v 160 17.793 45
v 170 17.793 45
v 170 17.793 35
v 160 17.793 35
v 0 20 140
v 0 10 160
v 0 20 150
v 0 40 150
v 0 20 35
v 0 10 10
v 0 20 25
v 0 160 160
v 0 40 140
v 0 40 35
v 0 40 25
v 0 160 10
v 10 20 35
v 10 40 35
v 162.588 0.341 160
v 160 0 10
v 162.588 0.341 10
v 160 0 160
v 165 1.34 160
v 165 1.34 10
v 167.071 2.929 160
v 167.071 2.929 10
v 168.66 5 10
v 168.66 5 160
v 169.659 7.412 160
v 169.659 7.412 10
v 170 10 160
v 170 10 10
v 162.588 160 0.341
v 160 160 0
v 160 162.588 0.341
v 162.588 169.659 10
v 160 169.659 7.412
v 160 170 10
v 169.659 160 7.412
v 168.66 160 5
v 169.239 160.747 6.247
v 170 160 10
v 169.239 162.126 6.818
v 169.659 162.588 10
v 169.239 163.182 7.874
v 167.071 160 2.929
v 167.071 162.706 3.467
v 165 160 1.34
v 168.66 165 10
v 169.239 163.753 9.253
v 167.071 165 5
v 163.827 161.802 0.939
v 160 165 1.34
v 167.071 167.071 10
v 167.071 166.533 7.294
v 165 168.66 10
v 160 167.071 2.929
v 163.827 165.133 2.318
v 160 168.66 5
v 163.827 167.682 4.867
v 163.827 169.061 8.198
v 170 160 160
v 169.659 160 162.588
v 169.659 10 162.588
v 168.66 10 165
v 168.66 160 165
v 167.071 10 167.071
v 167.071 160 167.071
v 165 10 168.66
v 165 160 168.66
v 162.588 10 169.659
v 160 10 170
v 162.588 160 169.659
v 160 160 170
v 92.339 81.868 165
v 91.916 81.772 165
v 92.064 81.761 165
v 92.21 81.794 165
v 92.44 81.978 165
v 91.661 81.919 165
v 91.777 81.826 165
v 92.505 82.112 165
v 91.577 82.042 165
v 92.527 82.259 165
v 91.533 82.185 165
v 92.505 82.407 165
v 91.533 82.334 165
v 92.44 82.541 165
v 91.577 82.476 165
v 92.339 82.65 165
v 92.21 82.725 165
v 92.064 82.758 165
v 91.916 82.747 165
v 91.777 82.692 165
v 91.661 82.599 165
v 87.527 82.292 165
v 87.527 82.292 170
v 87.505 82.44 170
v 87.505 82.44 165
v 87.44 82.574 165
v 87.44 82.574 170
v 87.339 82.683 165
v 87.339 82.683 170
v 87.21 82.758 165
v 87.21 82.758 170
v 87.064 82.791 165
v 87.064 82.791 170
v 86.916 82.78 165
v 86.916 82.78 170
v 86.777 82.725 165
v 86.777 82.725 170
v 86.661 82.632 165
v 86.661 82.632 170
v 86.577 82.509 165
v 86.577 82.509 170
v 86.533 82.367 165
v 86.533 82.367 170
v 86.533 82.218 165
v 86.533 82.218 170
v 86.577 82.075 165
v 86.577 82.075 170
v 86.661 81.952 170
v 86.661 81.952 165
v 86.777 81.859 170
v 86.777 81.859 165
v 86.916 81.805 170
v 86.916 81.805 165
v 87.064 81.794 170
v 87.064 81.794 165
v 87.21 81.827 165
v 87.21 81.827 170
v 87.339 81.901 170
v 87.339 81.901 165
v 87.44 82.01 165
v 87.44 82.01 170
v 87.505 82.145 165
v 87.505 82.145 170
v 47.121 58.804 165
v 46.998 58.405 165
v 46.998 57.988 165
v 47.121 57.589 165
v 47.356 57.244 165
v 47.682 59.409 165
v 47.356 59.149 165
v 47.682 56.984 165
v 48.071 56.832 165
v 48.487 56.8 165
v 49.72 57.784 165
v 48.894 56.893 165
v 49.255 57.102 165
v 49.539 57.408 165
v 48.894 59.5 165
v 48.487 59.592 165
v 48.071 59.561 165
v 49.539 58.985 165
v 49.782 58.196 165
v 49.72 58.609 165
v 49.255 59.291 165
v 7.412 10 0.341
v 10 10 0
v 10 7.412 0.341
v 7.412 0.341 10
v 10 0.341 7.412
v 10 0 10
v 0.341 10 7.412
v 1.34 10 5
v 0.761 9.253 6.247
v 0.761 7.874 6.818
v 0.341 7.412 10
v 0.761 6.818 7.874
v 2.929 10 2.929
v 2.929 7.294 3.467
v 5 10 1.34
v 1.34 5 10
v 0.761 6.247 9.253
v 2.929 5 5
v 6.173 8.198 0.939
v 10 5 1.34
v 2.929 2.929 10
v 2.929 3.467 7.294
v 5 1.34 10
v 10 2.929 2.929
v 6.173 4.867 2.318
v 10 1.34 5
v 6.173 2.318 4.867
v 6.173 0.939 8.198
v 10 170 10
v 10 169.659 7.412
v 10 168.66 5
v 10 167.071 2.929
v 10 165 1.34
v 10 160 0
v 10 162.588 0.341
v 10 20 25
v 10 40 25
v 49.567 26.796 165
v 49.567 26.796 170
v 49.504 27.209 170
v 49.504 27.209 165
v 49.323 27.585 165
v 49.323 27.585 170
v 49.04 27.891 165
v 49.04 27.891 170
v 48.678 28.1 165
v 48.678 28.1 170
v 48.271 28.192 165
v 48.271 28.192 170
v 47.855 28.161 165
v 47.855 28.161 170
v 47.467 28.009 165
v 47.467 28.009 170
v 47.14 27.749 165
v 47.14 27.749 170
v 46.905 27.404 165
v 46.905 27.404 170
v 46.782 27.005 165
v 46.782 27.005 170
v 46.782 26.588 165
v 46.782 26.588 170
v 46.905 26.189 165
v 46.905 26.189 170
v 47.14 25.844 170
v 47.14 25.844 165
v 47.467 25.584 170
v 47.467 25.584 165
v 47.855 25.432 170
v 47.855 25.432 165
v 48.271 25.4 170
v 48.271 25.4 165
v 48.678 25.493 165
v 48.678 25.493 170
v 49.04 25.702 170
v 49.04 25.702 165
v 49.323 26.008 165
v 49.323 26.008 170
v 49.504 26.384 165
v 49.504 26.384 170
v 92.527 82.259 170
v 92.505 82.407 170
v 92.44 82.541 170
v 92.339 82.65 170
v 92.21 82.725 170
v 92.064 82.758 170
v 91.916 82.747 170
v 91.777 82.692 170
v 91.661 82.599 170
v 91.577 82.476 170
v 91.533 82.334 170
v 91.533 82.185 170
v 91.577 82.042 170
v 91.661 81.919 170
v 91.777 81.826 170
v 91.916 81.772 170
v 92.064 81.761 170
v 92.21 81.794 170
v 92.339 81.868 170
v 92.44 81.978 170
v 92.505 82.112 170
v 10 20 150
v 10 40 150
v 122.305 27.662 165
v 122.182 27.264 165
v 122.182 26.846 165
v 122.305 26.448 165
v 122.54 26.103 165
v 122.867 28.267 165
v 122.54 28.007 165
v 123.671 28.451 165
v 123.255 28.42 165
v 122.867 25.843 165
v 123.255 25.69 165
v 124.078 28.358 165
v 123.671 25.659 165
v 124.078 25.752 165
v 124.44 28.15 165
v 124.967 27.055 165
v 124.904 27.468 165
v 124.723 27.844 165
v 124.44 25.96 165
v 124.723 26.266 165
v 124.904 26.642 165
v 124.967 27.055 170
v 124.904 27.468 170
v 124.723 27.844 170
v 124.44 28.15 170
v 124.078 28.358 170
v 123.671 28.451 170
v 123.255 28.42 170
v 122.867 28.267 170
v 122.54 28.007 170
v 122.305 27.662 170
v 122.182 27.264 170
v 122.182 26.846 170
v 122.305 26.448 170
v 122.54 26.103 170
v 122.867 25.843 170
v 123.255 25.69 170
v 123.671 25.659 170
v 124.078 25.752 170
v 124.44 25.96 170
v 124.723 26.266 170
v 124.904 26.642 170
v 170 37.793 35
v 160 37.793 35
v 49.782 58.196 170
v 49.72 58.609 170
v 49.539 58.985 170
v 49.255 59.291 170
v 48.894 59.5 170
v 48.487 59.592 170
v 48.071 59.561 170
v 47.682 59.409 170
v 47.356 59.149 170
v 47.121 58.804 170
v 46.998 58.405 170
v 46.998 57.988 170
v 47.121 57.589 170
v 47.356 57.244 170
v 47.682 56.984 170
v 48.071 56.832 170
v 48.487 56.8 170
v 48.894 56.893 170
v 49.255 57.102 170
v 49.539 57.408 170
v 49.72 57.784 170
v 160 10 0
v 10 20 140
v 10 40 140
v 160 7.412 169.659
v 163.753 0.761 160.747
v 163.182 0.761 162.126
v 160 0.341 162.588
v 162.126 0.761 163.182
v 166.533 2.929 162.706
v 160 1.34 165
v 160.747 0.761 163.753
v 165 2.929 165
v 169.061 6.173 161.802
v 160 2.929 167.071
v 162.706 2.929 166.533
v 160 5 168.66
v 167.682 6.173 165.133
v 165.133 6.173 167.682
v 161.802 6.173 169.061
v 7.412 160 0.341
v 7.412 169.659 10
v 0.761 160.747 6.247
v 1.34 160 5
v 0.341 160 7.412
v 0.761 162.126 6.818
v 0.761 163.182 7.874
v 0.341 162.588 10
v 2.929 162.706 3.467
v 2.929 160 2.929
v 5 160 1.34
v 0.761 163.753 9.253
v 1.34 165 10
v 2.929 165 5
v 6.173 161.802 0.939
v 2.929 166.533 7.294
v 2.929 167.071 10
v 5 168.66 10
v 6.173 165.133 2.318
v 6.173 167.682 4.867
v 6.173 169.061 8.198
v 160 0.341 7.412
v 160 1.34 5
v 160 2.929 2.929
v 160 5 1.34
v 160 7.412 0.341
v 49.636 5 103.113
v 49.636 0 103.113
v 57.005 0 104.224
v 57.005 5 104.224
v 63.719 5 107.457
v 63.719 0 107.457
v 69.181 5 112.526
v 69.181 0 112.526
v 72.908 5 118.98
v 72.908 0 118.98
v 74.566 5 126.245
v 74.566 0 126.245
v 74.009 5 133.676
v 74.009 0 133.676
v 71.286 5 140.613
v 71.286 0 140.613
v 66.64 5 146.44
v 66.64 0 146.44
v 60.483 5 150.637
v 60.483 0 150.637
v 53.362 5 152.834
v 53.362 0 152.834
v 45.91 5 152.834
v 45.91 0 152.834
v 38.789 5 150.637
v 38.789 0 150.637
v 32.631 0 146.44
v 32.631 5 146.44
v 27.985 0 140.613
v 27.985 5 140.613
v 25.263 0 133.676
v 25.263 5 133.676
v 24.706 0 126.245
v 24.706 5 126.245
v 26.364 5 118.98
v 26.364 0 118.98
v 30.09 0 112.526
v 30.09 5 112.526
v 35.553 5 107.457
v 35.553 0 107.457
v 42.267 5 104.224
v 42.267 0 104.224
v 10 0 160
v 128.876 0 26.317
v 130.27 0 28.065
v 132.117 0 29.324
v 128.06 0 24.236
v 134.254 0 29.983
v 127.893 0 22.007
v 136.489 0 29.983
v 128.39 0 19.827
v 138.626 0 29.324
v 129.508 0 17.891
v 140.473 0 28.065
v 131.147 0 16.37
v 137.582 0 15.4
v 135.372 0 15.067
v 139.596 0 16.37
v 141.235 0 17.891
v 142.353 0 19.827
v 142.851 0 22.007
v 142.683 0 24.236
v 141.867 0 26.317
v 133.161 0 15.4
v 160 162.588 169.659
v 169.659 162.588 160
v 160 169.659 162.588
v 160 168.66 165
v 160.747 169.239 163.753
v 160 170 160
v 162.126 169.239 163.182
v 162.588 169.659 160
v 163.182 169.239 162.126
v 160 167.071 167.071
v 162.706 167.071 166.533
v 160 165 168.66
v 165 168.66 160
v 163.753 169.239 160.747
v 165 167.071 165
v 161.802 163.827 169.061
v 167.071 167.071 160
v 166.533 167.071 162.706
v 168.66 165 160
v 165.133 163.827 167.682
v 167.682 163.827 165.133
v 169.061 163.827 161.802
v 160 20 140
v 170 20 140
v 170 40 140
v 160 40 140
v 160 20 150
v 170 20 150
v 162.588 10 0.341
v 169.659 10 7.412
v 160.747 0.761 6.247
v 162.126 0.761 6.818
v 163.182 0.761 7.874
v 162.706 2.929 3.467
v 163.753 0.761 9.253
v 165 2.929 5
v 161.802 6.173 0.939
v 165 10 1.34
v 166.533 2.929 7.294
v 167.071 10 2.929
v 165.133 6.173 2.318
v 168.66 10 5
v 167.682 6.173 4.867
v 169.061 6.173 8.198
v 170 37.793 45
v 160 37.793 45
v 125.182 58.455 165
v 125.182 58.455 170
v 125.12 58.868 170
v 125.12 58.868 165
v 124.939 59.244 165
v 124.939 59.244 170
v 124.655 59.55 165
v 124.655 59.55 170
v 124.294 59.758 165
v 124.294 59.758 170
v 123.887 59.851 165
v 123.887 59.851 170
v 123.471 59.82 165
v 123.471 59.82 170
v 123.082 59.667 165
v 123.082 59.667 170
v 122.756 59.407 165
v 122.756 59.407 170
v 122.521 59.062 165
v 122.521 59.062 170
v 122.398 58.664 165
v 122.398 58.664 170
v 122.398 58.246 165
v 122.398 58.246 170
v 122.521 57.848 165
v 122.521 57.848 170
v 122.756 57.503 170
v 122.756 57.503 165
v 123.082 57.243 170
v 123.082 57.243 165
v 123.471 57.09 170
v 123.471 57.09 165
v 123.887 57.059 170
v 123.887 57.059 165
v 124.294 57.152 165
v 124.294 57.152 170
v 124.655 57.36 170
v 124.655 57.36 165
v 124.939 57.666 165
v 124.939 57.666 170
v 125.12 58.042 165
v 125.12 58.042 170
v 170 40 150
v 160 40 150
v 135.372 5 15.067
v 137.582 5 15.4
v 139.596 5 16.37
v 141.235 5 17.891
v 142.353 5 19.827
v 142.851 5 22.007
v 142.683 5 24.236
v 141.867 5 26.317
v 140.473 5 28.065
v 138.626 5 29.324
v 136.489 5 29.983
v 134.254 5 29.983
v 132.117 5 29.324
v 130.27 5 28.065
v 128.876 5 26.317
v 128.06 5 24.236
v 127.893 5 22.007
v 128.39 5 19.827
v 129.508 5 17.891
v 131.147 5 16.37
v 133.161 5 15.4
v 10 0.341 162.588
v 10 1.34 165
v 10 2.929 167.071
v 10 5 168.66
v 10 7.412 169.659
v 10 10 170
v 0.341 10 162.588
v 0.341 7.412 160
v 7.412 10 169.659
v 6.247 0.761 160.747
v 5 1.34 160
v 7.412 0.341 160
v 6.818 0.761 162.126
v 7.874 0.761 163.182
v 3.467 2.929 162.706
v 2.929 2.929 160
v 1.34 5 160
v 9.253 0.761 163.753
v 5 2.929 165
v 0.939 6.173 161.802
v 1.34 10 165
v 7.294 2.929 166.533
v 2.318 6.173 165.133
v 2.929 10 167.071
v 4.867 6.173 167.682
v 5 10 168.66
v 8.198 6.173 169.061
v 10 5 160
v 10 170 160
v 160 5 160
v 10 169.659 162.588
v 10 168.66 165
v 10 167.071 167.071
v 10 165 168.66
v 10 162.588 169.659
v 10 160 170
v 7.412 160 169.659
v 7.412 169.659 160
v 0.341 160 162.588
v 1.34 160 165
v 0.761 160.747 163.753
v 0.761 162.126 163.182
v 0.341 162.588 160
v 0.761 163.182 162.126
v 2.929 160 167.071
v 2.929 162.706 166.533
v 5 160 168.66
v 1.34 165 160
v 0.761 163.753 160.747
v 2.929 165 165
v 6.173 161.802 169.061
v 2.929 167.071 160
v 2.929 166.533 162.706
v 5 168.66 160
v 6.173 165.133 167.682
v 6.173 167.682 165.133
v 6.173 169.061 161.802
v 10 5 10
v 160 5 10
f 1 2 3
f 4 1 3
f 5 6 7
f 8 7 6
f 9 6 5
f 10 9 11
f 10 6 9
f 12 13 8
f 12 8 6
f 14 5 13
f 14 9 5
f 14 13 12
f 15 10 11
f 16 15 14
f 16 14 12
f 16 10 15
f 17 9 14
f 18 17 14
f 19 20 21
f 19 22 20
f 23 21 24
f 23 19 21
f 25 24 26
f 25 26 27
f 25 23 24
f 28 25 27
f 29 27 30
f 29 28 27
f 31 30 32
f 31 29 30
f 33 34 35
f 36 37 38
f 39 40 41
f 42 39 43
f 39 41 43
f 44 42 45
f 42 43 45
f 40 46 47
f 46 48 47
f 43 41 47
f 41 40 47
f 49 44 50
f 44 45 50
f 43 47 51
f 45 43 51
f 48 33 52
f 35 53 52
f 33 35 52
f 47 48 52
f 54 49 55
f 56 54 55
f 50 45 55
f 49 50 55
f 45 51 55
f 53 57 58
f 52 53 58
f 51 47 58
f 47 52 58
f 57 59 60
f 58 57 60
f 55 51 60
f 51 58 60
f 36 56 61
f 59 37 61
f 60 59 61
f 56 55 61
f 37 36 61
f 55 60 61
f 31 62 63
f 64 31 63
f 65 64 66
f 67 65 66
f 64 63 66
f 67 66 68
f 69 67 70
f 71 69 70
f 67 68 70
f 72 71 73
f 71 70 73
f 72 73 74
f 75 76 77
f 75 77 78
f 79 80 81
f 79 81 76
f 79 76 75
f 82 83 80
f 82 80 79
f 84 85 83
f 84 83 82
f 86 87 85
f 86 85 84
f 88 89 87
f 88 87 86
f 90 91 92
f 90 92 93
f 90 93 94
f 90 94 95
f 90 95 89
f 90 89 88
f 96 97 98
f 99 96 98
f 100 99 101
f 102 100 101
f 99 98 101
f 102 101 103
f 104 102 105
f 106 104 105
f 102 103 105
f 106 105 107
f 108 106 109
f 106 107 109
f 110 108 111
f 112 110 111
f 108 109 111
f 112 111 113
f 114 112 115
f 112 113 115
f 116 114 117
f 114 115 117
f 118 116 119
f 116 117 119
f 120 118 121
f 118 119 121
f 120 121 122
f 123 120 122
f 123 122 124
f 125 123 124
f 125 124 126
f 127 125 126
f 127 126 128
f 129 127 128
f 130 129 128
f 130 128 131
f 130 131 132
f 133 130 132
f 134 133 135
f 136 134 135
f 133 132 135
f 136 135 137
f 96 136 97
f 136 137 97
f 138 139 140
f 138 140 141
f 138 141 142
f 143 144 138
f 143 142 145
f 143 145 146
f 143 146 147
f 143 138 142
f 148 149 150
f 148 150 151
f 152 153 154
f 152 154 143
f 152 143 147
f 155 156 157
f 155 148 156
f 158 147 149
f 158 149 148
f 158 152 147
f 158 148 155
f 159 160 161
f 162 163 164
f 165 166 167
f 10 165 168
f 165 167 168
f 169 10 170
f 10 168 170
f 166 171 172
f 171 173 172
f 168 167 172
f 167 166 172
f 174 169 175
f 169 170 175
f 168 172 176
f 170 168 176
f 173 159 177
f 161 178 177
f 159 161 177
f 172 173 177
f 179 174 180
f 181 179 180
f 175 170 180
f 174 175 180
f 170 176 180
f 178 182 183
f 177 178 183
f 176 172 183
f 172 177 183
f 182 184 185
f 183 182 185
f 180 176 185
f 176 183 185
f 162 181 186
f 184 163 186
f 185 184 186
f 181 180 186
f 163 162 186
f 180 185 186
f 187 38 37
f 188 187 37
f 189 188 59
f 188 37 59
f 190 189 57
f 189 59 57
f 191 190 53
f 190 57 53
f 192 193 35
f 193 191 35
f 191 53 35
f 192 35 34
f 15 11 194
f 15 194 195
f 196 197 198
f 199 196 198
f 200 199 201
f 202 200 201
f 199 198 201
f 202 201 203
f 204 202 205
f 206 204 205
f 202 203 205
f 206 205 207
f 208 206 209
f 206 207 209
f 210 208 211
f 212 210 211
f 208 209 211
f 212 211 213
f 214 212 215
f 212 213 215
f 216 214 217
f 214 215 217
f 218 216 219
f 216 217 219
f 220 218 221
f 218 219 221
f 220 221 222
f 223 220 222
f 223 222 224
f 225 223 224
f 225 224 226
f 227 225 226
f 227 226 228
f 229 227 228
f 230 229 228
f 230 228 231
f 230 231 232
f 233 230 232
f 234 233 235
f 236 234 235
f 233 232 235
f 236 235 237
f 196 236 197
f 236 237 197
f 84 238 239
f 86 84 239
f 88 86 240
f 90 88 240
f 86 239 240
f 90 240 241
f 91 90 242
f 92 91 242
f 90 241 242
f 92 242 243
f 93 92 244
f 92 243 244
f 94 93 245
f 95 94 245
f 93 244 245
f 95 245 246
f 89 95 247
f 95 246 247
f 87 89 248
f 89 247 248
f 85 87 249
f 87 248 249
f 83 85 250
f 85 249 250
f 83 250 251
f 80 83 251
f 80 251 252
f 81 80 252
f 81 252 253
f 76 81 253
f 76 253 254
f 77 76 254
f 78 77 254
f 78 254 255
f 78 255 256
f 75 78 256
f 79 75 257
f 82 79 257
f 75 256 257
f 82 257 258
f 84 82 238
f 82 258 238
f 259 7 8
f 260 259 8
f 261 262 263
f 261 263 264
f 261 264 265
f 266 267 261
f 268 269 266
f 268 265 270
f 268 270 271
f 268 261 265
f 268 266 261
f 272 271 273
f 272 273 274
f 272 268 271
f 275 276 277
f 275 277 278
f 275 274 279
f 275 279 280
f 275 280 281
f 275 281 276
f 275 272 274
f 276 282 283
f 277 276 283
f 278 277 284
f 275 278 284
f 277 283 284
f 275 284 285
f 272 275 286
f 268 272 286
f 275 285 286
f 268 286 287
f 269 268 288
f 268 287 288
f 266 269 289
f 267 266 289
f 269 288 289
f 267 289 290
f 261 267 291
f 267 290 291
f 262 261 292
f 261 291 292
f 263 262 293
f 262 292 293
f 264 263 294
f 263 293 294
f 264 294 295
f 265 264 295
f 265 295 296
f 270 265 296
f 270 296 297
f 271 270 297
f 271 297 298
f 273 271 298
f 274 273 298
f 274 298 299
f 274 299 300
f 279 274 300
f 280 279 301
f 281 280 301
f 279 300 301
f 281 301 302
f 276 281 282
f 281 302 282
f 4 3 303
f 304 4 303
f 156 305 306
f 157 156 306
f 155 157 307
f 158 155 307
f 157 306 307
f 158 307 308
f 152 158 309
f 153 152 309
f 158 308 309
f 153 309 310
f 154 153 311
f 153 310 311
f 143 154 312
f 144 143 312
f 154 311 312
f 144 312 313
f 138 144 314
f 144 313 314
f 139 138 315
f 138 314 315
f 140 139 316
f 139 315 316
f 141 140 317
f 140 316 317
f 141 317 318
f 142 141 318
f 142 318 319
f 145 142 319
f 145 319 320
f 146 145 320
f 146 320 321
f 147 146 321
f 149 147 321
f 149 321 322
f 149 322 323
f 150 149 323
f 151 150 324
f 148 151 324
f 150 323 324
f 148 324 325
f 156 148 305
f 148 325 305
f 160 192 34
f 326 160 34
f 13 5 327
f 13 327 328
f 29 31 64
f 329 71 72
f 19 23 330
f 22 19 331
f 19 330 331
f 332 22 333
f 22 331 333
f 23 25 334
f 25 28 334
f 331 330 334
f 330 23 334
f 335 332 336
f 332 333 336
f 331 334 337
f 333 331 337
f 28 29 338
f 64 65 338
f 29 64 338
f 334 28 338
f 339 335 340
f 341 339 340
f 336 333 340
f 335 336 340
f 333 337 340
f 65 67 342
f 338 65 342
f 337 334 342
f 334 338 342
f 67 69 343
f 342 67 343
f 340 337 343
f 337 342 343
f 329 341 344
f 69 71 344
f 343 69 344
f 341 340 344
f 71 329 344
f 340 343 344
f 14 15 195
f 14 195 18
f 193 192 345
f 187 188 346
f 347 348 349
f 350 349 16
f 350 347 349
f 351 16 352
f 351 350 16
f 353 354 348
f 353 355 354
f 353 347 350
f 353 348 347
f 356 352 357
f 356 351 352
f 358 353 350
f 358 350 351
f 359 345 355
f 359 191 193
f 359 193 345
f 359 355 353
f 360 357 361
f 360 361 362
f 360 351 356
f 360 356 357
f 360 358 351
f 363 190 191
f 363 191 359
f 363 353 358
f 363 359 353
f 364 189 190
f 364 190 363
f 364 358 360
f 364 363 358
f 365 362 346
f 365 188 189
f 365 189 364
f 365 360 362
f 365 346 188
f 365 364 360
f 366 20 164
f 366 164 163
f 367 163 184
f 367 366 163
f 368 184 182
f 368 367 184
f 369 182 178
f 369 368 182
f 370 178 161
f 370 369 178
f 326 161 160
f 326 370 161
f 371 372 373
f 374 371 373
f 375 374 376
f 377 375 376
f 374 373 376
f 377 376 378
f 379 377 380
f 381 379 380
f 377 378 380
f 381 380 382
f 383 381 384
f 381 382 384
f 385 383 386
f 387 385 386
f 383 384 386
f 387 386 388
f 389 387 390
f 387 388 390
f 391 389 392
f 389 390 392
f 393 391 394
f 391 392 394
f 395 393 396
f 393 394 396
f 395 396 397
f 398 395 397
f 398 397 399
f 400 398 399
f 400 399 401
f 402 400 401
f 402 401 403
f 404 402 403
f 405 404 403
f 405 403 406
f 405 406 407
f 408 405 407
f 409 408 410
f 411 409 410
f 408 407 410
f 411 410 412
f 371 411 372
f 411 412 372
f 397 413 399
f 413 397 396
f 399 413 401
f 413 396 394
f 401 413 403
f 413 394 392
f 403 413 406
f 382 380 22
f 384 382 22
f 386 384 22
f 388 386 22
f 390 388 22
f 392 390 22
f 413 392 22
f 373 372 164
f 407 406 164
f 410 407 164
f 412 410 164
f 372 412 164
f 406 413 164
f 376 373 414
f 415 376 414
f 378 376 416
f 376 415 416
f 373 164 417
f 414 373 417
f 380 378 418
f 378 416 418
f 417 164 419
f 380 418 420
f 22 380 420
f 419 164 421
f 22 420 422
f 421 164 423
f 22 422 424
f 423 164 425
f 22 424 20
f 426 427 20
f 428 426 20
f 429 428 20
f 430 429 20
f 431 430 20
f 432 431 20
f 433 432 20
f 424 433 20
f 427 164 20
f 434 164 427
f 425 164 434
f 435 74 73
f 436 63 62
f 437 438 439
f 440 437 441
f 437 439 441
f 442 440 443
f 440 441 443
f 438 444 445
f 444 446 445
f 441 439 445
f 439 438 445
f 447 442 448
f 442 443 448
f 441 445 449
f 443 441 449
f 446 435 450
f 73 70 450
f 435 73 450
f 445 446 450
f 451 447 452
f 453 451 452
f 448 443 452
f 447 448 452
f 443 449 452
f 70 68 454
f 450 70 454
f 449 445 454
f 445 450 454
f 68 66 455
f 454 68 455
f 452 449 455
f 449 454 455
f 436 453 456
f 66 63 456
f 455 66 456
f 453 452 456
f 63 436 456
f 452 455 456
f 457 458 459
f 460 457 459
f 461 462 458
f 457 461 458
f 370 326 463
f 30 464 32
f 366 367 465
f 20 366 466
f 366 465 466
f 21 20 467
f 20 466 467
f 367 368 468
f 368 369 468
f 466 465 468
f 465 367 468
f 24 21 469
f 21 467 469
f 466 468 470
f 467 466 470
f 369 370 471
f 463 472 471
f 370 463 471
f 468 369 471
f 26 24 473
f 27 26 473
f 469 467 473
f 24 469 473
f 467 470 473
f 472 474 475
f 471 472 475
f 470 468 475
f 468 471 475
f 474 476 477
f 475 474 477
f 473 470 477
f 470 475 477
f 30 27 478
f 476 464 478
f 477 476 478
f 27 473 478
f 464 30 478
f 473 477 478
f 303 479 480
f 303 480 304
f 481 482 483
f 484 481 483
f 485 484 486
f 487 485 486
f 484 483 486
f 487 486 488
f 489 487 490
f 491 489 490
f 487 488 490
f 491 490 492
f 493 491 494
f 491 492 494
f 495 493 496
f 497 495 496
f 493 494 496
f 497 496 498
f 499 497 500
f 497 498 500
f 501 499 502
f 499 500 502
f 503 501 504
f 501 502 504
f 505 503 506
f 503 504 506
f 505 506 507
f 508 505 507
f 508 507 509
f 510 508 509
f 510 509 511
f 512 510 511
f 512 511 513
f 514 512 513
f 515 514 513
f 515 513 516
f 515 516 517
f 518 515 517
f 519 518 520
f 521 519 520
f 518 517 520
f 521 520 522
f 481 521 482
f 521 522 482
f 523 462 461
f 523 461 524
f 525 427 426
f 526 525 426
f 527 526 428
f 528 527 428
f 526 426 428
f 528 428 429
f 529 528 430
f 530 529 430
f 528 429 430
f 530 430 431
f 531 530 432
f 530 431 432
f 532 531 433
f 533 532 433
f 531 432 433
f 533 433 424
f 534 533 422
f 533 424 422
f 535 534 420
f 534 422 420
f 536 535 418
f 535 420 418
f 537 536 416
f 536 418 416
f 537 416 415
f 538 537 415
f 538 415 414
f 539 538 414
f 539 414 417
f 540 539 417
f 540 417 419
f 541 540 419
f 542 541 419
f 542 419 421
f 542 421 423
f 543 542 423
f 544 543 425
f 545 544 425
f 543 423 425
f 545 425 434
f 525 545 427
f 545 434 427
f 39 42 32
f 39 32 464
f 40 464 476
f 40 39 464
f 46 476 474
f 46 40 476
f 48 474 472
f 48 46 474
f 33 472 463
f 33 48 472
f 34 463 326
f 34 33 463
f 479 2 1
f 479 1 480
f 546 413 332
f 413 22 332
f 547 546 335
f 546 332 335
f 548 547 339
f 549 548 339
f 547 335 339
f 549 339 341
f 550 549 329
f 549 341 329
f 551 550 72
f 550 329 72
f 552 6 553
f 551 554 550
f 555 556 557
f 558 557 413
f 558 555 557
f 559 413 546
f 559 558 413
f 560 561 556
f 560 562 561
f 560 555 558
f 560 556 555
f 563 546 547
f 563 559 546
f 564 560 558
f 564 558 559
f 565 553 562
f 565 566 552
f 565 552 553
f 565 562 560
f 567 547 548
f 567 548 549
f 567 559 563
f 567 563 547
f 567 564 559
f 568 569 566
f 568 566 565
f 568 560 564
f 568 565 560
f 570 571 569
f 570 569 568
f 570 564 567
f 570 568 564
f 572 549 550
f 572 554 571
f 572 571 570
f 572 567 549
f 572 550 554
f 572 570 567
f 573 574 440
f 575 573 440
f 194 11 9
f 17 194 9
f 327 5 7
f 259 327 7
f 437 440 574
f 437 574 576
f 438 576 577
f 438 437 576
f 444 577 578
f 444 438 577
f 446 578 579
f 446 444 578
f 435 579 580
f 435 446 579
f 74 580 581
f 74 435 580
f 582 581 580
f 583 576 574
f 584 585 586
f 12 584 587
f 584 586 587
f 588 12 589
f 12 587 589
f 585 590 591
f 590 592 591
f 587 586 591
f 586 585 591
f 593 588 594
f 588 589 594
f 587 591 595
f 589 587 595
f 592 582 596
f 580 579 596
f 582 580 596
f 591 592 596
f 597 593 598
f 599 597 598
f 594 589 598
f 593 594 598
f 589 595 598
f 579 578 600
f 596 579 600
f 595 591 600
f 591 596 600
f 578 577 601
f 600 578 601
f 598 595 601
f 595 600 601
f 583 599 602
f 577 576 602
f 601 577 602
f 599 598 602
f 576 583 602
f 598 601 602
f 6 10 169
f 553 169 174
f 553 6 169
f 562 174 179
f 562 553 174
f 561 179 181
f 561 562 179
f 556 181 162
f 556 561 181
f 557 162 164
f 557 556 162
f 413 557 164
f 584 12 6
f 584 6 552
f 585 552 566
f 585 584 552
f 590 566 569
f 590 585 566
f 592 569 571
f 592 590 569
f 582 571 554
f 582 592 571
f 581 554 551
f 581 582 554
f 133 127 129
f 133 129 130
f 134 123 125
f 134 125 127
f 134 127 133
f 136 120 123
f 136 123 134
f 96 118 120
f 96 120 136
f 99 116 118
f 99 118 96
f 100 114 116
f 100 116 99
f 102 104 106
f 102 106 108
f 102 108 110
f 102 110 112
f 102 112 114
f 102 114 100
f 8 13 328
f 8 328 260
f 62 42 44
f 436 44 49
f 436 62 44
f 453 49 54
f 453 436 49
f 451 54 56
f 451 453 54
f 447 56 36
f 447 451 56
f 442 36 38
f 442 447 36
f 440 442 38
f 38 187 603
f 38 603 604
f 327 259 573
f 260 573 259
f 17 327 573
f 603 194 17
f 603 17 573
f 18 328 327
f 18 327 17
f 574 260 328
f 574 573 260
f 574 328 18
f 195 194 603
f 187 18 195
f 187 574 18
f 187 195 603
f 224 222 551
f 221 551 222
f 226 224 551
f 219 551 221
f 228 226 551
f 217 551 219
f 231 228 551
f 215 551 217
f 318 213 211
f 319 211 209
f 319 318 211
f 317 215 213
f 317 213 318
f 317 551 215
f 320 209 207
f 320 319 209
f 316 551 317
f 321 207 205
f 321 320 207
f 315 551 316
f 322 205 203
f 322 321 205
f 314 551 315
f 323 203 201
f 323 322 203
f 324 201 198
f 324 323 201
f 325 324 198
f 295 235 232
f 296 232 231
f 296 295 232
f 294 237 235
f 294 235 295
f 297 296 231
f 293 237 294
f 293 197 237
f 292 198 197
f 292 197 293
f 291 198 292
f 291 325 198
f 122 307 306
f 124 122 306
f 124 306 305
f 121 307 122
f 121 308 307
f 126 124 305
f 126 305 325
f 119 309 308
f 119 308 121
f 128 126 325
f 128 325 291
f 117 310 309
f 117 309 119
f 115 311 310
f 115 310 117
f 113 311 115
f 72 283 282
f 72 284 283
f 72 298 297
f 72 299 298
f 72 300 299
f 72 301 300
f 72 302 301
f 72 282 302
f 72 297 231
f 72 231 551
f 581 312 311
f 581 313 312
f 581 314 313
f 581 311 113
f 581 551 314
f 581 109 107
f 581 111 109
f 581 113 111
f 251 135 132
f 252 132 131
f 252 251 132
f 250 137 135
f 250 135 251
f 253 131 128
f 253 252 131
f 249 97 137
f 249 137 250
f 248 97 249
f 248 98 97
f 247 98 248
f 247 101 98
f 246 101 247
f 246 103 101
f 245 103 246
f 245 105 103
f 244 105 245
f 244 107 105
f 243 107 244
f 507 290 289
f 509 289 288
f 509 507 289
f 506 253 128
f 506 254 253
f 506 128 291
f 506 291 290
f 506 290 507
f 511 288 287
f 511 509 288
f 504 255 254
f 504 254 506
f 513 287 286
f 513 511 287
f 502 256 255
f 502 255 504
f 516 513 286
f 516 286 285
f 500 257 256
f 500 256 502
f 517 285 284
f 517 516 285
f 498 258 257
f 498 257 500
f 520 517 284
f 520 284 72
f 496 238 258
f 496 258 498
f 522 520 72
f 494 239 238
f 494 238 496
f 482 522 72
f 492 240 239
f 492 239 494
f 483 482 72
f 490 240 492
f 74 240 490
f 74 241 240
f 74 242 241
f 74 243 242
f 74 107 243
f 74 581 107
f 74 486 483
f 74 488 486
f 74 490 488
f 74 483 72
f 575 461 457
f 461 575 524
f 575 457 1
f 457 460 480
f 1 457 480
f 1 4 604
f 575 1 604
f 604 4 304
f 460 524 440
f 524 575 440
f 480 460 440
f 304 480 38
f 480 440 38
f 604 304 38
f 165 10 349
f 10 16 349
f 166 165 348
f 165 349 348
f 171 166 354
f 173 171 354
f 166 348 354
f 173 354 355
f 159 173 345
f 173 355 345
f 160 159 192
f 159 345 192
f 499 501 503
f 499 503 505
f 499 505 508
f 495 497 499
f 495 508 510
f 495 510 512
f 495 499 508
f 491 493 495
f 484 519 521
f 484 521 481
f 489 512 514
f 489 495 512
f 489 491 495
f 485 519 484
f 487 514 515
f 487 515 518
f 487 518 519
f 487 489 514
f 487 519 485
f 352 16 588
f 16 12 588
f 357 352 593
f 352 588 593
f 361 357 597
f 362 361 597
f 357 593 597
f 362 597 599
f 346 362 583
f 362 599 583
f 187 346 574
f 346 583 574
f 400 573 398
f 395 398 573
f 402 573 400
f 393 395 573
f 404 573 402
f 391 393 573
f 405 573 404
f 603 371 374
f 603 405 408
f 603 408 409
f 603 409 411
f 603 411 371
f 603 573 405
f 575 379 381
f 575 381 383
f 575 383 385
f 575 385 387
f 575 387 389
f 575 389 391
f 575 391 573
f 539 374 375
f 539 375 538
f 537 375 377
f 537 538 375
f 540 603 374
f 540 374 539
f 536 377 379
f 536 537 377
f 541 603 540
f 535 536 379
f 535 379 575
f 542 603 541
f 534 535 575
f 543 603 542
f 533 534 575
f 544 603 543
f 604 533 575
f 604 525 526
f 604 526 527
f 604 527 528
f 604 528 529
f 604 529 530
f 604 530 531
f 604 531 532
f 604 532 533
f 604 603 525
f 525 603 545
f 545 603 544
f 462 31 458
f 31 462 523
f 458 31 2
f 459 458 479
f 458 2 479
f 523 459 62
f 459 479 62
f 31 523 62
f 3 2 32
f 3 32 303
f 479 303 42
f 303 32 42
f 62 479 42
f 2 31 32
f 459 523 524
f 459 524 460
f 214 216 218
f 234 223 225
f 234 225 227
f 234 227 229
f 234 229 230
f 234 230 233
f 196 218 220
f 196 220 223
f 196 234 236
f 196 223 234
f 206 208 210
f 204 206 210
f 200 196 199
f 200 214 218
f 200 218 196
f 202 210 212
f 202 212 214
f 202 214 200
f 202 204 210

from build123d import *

# Parameters (mm, degrees)
SKETCH1_W           = 170
SKETCH1_H           = 170
BOSS_EXTRUDE2_DEPTH = 170
FILLET5_R           = 10
SKETCH6_W           = 150
SKETCH6_H           = 150
CUT_EXTRUDE2_DEPTH  = 165
SKETCH7_R           = 25
CUT_EXTRUDE3_DEPTH  = 5
SKETCH8_R           = 0.5
CUT_EXTRUDE4_DEPTH  = 5
SKETCH9_R           = 7.5
CUT_EXTRUDE5_DEPTH  = 5
SKETCH10_R          = 1.4
CUT_EXTRUDE8_DEPTH  = 5
SKETCH19_W          = 10
SKETCH19_H          = 20
CUT_EXTRUDE12_DEPTH = 15
SKETCH14_W          = 10
SKETCH14_H          = 20
CUT_EXTRUDE15_DEPTH = 15
SKETCH14_5_W        = 10
SKETCH14_5_H        = 20
CUT_EXTRUDE16_DEPTH = 15


with BuildPart() as part:
    # Sketch1 → Boss-Extrude2 (new body)
    with BuildSketch(Plane.XY):
        with Locations((85, 85)):
            Rectangle(SKETCH1_W, SKETCH1_H)
    extrude(amount=BOSS_EXTRUDE2_DEPTH)

    # Fillet5
    fillet5_edges = [part.edges().sort_by_distance(p)[0] for p in [
        (170, 170, 85),
        (85, 170, 0),
        (0, 85, 0),
        (170, 85, 0),
        (85, 0, 0),
        (170, 0, 85),
        (170, 85, 170),
        (85, 170, 170),
        (0, 170, 85),
        (0, 0, 85),
        (85, 0, 170),
        (0, 85, 170),
    ]]
    fillet(fillet5_edges, radius=FILLET5_R)

    # Sketch6 → Cut-Extrude2 (cut)
    with BuildSketch(Plane(origin=(0, 170, 0), x_dir=(1, 0, 0), z_dir=(0, 1, 0))):
        with Locations((85, -85)):
            Rectangle(SKETCH6_W, SKETCH6_H)
    extrude(amount=-CUT_EXTRUDE2_DEPTH, mode=Mode.SUBTRACT)

    # Sketch7 → Cut-Extrude3 (cut)
    with BuildSketch(Plane(origin=(0, 0, 0), x_dir=(-1, 0, 0), z_dir=(0, -1, 0))):
        with Locations((-49.635709215, -128.113207768)):
            Circle(SKETCH7_R)
    extrude(amount=-CUT_EXTRUDE3_DEPTH, mode=Mode.SUBTRACT)

    # Sketch8 → Cut-Extrude4 (cut)
    with BuildSketch(Plane.XY.offset(170)):
        with Locations((87.027102924, 82.292149715)):
            Circle(SKETCH8_R)
        with Locations((92.027102924, 82.259165374)):
            Circle(SKETCH8_R)
    extrude(amount=-CUT_EXTRUDE4_DEPTH, mode=Mode.SUBTRACT)

    # Sketch9 → Cut-Extrude5 (cut)
    with BuildSketch(Plane(origin=(0, 0, 0), x_dir=(-1, 0, 0), z_dir=(0, -1, 0))):
        with Locations((-135.371528781, -22.567188871)):
            Circle(SKETCH9_R)
    extrude(amount=-CUT_EXTRUDE5_DEPTH, mode=Mode.SUBTRACT)

    # Sketch10 → Cut-Extrude8 (cut)
    with BuildSketch(Plane.XY.offset(170)):
        with Locations((48.382145487, 58.196404185)):
            Circle(SKETCH10_R)
        with Locations((123.782145487, 58.455011456)):
            Circle(SKETCH10_R)
        with Locations((48.166639428, 26.796404185)):
            Circle(SKETCH10_R)
        with Locations((123.566639428, 27.055011456)):
            Circle(SKETCH10_R)
    extrude(amount=-CUT_EXTRUDE8_DEPTH, mode=Mode.SUBTRACT)

    # Sketch19 → Cut-Extrude12 (cut)
    with BuildSketch(Plane(origin=(170, 0, 0), x_dir=(0, 0, -1), z_dir=(1, 0, 0))):
        with Locations((-40, 27.793299749)):
            Rectangle(SKETCH19_W, SKETCH19_H)
        with Locations((-145, 30)):
            Rectangle(SKETCH19_W, SKETCH19_H)
    extrude(amount=-CUT_EXTRUDE12_DEPTH, mode=Mode.SUBTRACT)

    # Sketch14 → Cut-Extrude15 (cut)
    with BuildSketch(Plane.ZY):
        with Locations((30, 30)):
            Rectangle(SKETCH14_W, SKETCH14_H)
    extrude(amount=-CUT_EXTRUDE15_DEPTH, mode=Mode.SUBTRACT)

    # Sketch14<5> → Cut-Extrude16 (cut)
    with BuildSketch(Plane.ZY):
        with Locations((30, 30)):
            Rectangle(SKETCH14_5_W, SKETCH14_5_H)
        with Locations((145, 30)):
            Rectangle(SKETCH14_5_W, SKETCH14_5_H)
    extrude(amount=-CUT_EXTRUDE16_DEPTH, mode=Mode.SUBTRACT)


solid = part.part
